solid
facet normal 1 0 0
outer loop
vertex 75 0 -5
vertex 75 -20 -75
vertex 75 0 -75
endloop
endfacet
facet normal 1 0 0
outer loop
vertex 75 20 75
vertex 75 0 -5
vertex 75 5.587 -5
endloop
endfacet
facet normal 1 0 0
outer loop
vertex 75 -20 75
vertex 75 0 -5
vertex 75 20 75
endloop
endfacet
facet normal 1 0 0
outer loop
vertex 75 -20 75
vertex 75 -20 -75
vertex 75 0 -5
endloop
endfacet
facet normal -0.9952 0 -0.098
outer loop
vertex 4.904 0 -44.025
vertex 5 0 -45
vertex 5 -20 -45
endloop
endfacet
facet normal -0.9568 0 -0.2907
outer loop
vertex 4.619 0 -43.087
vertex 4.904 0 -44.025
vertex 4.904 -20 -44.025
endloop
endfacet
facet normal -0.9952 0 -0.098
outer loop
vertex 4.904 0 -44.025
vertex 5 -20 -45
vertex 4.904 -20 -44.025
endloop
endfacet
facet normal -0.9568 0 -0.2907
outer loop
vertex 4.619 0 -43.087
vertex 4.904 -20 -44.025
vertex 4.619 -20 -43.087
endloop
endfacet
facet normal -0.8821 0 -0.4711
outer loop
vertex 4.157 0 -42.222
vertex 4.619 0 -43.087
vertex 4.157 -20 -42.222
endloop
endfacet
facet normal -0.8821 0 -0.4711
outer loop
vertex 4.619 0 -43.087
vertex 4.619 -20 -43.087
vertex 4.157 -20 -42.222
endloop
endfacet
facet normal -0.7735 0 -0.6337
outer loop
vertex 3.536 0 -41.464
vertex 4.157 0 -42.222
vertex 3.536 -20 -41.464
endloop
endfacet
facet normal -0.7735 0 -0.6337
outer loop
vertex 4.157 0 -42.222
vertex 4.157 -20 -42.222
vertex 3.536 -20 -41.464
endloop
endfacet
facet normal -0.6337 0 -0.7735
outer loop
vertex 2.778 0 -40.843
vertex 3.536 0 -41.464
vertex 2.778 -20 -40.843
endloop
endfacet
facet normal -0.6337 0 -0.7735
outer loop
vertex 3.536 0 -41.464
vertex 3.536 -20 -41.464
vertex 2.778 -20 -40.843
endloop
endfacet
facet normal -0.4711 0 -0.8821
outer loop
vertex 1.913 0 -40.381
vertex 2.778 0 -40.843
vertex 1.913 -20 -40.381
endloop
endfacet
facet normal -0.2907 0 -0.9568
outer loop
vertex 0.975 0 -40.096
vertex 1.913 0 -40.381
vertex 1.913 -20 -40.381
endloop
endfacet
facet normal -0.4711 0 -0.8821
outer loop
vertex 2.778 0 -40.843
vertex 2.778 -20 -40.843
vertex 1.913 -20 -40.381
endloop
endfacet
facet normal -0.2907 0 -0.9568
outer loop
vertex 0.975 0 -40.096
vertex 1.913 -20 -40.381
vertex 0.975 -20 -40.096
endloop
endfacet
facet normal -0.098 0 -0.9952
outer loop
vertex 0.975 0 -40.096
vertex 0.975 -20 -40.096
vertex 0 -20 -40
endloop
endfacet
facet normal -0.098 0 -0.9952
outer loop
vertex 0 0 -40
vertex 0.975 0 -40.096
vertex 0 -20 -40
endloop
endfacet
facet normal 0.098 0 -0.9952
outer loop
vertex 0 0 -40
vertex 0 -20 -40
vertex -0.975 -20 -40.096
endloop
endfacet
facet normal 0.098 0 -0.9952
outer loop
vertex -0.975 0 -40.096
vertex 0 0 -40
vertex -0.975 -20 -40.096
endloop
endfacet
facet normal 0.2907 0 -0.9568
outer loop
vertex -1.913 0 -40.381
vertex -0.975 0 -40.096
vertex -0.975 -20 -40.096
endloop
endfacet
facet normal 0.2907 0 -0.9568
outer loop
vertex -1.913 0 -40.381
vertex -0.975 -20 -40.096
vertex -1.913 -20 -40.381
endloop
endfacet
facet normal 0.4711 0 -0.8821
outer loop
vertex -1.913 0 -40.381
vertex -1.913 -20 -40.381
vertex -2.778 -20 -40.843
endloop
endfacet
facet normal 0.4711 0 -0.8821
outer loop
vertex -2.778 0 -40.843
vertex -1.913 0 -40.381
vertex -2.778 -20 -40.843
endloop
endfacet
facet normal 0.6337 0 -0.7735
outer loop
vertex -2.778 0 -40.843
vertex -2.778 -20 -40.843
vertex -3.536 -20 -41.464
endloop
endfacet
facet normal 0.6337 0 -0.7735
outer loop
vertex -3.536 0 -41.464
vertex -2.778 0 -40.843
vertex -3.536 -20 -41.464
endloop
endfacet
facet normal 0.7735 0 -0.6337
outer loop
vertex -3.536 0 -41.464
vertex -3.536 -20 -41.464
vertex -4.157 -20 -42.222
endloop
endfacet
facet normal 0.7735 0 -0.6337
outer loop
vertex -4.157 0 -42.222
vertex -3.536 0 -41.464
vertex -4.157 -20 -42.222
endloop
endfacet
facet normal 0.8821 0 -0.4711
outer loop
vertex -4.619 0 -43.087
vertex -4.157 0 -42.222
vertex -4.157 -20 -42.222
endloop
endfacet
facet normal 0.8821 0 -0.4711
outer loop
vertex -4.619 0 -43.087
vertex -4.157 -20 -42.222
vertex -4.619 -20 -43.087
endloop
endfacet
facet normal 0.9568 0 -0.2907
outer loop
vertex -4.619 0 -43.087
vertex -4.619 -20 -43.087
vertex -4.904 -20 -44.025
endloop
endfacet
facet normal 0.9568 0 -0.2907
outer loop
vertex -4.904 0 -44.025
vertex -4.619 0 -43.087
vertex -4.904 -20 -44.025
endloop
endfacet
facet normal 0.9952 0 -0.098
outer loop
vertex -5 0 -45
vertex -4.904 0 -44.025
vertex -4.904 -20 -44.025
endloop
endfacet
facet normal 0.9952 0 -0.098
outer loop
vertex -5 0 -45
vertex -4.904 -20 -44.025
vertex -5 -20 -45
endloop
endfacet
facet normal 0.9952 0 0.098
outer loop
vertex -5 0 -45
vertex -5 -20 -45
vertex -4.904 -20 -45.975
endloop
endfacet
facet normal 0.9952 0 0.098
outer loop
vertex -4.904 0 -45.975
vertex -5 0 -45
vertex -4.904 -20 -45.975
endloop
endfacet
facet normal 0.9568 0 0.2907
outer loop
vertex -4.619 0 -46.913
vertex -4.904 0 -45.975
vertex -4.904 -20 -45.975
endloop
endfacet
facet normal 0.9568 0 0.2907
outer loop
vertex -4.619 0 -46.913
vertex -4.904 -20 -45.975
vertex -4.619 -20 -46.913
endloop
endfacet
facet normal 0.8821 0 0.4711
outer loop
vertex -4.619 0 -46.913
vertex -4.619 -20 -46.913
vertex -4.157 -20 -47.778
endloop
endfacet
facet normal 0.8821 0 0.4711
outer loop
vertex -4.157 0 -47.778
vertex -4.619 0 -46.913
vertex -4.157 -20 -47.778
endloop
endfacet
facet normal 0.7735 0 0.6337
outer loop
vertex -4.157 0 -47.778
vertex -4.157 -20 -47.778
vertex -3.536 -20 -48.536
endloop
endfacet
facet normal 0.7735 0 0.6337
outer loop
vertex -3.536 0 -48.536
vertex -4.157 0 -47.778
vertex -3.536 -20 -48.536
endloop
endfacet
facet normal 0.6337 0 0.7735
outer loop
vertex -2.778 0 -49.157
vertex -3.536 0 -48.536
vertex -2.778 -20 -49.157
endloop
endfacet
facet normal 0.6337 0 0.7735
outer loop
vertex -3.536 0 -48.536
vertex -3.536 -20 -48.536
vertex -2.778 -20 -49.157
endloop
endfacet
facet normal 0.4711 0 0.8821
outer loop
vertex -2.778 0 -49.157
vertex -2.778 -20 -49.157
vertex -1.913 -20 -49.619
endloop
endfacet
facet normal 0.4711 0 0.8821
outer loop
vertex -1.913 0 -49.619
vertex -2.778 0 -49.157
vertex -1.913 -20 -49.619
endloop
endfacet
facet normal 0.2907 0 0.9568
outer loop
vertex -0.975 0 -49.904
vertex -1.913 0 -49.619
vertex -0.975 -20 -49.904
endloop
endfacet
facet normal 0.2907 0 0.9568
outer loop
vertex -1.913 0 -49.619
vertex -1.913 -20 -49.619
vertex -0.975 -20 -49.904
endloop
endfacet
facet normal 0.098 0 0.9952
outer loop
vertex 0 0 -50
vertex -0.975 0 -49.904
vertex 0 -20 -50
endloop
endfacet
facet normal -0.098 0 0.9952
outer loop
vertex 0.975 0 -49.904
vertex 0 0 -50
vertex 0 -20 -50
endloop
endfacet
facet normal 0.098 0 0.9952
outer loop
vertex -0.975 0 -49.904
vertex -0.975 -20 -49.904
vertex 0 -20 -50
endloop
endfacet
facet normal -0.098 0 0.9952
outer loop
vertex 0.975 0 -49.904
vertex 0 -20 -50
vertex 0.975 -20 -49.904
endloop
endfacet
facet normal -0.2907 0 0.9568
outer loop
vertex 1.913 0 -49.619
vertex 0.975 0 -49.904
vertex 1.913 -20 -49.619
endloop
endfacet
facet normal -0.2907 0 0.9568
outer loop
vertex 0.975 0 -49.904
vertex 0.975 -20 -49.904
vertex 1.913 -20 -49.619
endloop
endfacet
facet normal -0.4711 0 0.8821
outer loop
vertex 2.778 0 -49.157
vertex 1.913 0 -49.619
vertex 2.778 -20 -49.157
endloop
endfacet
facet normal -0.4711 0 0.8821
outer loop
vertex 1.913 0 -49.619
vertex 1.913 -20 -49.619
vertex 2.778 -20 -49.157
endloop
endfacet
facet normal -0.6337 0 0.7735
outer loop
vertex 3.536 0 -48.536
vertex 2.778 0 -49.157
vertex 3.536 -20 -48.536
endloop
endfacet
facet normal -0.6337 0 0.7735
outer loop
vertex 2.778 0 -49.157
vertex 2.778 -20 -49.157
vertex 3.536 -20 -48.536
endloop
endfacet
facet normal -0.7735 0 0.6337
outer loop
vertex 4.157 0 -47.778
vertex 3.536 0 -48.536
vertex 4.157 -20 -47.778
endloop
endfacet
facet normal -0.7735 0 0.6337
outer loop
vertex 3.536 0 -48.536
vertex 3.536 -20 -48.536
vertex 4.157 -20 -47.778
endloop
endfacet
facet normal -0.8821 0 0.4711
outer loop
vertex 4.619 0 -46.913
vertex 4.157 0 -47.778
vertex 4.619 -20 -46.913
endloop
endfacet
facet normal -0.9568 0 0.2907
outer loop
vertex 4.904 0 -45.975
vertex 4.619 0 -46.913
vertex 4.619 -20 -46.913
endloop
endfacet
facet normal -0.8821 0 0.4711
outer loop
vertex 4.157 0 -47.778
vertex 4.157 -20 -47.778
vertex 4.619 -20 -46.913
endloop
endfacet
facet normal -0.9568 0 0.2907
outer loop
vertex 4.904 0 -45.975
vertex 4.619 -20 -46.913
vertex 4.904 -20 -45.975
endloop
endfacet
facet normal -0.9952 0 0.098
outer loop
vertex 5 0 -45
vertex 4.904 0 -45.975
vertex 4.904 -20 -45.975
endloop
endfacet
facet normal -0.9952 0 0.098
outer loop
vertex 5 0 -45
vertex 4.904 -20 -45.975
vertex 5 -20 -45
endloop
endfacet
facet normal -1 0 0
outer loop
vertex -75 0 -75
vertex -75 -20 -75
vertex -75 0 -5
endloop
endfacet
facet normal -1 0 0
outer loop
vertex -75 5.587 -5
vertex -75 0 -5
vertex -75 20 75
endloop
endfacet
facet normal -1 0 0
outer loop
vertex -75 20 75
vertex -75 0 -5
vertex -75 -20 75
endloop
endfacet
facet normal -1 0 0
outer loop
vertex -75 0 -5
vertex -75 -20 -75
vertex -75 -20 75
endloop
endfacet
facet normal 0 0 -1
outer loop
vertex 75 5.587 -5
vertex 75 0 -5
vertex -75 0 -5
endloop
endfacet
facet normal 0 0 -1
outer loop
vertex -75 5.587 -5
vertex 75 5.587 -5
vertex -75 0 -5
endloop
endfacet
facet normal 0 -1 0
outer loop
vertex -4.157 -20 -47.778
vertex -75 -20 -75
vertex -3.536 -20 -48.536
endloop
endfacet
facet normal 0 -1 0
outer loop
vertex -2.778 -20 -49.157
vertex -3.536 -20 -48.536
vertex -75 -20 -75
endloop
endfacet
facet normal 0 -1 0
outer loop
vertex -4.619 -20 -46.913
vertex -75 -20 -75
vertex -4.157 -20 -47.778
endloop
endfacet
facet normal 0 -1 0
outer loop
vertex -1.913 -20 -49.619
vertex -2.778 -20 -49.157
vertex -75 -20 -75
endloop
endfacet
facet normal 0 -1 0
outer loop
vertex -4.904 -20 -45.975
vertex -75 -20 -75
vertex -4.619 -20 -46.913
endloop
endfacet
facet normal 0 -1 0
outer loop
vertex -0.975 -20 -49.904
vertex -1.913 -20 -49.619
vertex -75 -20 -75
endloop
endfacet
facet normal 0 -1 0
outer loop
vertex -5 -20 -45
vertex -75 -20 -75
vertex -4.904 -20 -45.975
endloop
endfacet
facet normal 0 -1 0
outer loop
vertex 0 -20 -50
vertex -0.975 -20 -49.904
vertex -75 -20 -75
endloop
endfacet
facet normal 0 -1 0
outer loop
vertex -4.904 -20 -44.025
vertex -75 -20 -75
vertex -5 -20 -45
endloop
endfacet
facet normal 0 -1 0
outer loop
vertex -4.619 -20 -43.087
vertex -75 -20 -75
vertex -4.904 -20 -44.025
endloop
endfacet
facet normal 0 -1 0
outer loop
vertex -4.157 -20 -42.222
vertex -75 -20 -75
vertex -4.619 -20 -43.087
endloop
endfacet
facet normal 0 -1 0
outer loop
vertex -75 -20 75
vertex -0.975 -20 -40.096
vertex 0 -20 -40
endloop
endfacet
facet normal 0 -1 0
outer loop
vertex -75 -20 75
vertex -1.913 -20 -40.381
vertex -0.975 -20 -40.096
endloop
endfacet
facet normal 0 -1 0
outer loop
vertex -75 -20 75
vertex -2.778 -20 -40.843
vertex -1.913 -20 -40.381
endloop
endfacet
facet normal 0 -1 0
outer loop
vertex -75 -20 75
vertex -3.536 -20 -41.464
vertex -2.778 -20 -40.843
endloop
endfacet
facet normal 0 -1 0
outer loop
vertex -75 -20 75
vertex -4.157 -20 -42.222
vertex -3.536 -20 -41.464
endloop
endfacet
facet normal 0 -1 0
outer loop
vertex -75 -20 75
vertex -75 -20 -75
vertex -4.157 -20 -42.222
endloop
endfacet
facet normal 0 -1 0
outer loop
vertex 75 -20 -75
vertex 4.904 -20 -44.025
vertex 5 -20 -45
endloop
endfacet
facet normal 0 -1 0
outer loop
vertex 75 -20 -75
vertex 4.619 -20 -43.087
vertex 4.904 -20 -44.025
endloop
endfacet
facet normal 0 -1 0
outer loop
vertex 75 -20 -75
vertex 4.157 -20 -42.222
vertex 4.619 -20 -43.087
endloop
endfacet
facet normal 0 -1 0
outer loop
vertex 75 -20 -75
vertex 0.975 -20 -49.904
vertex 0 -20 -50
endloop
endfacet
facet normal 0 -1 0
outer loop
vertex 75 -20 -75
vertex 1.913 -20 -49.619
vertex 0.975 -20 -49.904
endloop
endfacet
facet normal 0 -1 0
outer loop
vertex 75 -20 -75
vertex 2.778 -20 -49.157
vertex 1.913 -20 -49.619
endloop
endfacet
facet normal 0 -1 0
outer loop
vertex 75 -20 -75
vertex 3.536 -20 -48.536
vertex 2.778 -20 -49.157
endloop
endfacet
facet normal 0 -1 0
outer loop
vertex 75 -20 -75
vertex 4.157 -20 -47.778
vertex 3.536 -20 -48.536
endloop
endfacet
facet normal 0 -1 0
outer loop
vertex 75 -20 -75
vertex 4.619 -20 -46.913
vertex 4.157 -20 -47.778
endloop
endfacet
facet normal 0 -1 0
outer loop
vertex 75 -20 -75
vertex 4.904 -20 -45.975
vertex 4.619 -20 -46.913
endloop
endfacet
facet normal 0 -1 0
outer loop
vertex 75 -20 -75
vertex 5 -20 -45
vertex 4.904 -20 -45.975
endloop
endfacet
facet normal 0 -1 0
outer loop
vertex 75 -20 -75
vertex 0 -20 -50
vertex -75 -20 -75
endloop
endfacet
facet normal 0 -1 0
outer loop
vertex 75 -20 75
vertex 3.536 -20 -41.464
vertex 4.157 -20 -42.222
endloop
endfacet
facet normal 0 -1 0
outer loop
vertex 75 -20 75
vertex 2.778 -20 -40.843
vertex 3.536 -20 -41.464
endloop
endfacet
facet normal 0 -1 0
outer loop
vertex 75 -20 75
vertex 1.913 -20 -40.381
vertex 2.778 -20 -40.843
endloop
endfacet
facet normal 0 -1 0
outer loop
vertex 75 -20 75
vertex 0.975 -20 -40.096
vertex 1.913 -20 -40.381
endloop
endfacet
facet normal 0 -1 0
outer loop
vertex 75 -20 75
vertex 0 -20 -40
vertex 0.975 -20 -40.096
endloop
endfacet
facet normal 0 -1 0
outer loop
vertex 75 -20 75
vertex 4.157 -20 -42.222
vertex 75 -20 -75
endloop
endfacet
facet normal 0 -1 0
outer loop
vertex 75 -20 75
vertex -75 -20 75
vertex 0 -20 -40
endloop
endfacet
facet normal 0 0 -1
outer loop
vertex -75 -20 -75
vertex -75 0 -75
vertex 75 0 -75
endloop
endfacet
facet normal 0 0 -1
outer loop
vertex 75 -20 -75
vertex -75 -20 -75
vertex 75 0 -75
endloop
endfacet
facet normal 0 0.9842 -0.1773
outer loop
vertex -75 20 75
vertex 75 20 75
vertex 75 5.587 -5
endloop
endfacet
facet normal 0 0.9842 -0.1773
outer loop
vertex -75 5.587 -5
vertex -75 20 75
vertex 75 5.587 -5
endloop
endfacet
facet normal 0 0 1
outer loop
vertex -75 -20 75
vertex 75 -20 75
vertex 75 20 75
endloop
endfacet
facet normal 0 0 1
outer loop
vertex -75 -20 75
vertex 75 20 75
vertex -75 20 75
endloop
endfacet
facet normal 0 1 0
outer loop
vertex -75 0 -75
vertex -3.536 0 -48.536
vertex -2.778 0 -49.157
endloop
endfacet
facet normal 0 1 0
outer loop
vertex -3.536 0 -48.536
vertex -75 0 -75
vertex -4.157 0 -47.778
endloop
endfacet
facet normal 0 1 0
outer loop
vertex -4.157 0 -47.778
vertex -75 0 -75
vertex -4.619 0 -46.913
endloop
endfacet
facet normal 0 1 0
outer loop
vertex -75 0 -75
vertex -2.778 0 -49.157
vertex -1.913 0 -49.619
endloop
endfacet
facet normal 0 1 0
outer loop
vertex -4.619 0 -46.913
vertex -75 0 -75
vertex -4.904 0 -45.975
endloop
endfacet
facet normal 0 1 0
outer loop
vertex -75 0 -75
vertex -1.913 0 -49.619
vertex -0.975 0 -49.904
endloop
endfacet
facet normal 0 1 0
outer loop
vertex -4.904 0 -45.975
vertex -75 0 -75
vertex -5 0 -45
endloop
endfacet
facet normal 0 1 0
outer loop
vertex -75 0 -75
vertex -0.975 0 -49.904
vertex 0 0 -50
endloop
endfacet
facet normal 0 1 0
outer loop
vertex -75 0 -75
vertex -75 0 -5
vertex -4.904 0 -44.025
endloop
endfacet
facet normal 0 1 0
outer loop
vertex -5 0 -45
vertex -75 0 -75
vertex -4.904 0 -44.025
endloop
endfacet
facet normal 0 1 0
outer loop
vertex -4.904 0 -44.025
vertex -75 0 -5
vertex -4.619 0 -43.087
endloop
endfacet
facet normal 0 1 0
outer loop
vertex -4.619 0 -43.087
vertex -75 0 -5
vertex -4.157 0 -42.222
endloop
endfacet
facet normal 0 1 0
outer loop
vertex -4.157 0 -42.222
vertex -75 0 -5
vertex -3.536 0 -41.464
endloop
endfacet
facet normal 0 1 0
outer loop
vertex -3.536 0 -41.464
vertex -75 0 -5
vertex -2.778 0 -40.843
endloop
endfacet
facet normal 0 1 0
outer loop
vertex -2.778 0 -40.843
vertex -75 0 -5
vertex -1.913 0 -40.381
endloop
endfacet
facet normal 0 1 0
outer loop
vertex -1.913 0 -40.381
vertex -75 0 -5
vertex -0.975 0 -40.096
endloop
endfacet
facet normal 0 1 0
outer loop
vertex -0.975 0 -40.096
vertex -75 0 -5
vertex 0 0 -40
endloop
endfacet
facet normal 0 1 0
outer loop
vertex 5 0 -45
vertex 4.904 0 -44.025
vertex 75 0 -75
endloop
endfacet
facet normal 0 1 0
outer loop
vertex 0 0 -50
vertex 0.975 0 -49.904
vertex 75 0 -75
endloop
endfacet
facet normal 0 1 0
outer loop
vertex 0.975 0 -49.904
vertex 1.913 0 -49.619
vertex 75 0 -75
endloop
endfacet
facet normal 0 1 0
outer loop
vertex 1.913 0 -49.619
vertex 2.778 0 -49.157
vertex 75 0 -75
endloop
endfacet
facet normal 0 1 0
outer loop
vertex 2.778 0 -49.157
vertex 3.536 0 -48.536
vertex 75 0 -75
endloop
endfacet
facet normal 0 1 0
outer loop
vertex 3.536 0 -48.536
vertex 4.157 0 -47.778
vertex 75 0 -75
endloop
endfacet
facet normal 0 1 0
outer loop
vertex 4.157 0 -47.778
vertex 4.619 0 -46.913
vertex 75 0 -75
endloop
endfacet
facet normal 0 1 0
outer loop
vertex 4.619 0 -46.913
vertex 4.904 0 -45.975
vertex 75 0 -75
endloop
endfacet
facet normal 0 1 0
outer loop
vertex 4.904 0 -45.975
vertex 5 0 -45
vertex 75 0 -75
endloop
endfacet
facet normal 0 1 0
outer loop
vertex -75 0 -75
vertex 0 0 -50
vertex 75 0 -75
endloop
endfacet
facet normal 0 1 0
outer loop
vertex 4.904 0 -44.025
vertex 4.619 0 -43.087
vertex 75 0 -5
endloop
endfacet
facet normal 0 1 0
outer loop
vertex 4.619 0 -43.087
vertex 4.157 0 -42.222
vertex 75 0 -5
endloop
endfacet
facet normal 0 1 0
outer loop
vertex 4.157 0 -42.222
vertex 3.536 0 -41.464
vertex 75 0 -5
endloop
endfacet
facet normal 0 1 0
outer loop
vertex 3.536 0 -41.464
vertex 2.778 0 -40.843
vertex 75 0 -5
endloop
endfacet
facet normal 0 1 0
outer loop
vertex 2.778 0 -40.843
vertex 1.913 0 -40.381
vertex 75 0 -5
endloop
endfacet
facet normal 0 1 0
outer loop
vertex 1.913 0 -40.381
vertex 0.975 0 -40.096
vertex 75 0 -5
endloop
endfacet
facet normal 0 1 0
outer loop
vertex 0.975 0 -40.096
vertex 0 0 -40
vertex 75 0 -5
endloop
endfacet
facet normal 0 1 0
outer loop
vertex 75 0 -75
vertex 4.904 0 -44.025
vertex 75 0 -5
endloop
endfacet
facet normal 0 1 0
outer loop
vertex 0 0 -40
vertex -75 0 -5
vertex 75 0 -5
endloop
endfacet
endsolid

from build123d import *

# Parameters (mm, degrees)
F0_W     = 150
F0_H     = 150
F1_DEPTH = 20
F2_W     = 150
F2_H     = 80
F3_DEPTH = 20
F5_DEPTH = 150.001
F6_R     = 5
F7_DEPTH = 40.001


# Not quite as in the source:
# - a feature names something its author has since deleted; it is built from what else it names


with BuildPart() as f1:
    # F0 (on Front) → F1 (new body)
    with BuildSketch(Plane.XZ):
        Rectangle(F0_W, F0_H)
    extrude(amount=F1_DEPTH)

    # F2 (on face) → F3 (join)
    with BuildSketch(Plane(origin=(0, 0, 0), x_dir=(-1, 0, 0), z_dir=(0, 1, 0))):
        with Locations((0, 35)):
            Rectangle(F2_W, F2_H)
    extrude(amount=F3_DEPTH)

    # F4 (on face) → F5 (cut, through all)
    with BuildSketch(Plane.YZ.offset(75)):
        Polygon((20, -5), (20, 75), (5.5873245001, -5), align=None)
    extrude(amount=-F5_DEPTH, mode=Mode.SUBTRACT)

    # F6 (on face) → F7 (cut, through all)
    with BuildSketch(Plane.XZ.offset(20)):
        with Locations((0, -45)):
            Circle(F6_R)
    extrude(amount=-F7_DEPTH, mode=Mode.SUBTRACT)


solid = f1.part
